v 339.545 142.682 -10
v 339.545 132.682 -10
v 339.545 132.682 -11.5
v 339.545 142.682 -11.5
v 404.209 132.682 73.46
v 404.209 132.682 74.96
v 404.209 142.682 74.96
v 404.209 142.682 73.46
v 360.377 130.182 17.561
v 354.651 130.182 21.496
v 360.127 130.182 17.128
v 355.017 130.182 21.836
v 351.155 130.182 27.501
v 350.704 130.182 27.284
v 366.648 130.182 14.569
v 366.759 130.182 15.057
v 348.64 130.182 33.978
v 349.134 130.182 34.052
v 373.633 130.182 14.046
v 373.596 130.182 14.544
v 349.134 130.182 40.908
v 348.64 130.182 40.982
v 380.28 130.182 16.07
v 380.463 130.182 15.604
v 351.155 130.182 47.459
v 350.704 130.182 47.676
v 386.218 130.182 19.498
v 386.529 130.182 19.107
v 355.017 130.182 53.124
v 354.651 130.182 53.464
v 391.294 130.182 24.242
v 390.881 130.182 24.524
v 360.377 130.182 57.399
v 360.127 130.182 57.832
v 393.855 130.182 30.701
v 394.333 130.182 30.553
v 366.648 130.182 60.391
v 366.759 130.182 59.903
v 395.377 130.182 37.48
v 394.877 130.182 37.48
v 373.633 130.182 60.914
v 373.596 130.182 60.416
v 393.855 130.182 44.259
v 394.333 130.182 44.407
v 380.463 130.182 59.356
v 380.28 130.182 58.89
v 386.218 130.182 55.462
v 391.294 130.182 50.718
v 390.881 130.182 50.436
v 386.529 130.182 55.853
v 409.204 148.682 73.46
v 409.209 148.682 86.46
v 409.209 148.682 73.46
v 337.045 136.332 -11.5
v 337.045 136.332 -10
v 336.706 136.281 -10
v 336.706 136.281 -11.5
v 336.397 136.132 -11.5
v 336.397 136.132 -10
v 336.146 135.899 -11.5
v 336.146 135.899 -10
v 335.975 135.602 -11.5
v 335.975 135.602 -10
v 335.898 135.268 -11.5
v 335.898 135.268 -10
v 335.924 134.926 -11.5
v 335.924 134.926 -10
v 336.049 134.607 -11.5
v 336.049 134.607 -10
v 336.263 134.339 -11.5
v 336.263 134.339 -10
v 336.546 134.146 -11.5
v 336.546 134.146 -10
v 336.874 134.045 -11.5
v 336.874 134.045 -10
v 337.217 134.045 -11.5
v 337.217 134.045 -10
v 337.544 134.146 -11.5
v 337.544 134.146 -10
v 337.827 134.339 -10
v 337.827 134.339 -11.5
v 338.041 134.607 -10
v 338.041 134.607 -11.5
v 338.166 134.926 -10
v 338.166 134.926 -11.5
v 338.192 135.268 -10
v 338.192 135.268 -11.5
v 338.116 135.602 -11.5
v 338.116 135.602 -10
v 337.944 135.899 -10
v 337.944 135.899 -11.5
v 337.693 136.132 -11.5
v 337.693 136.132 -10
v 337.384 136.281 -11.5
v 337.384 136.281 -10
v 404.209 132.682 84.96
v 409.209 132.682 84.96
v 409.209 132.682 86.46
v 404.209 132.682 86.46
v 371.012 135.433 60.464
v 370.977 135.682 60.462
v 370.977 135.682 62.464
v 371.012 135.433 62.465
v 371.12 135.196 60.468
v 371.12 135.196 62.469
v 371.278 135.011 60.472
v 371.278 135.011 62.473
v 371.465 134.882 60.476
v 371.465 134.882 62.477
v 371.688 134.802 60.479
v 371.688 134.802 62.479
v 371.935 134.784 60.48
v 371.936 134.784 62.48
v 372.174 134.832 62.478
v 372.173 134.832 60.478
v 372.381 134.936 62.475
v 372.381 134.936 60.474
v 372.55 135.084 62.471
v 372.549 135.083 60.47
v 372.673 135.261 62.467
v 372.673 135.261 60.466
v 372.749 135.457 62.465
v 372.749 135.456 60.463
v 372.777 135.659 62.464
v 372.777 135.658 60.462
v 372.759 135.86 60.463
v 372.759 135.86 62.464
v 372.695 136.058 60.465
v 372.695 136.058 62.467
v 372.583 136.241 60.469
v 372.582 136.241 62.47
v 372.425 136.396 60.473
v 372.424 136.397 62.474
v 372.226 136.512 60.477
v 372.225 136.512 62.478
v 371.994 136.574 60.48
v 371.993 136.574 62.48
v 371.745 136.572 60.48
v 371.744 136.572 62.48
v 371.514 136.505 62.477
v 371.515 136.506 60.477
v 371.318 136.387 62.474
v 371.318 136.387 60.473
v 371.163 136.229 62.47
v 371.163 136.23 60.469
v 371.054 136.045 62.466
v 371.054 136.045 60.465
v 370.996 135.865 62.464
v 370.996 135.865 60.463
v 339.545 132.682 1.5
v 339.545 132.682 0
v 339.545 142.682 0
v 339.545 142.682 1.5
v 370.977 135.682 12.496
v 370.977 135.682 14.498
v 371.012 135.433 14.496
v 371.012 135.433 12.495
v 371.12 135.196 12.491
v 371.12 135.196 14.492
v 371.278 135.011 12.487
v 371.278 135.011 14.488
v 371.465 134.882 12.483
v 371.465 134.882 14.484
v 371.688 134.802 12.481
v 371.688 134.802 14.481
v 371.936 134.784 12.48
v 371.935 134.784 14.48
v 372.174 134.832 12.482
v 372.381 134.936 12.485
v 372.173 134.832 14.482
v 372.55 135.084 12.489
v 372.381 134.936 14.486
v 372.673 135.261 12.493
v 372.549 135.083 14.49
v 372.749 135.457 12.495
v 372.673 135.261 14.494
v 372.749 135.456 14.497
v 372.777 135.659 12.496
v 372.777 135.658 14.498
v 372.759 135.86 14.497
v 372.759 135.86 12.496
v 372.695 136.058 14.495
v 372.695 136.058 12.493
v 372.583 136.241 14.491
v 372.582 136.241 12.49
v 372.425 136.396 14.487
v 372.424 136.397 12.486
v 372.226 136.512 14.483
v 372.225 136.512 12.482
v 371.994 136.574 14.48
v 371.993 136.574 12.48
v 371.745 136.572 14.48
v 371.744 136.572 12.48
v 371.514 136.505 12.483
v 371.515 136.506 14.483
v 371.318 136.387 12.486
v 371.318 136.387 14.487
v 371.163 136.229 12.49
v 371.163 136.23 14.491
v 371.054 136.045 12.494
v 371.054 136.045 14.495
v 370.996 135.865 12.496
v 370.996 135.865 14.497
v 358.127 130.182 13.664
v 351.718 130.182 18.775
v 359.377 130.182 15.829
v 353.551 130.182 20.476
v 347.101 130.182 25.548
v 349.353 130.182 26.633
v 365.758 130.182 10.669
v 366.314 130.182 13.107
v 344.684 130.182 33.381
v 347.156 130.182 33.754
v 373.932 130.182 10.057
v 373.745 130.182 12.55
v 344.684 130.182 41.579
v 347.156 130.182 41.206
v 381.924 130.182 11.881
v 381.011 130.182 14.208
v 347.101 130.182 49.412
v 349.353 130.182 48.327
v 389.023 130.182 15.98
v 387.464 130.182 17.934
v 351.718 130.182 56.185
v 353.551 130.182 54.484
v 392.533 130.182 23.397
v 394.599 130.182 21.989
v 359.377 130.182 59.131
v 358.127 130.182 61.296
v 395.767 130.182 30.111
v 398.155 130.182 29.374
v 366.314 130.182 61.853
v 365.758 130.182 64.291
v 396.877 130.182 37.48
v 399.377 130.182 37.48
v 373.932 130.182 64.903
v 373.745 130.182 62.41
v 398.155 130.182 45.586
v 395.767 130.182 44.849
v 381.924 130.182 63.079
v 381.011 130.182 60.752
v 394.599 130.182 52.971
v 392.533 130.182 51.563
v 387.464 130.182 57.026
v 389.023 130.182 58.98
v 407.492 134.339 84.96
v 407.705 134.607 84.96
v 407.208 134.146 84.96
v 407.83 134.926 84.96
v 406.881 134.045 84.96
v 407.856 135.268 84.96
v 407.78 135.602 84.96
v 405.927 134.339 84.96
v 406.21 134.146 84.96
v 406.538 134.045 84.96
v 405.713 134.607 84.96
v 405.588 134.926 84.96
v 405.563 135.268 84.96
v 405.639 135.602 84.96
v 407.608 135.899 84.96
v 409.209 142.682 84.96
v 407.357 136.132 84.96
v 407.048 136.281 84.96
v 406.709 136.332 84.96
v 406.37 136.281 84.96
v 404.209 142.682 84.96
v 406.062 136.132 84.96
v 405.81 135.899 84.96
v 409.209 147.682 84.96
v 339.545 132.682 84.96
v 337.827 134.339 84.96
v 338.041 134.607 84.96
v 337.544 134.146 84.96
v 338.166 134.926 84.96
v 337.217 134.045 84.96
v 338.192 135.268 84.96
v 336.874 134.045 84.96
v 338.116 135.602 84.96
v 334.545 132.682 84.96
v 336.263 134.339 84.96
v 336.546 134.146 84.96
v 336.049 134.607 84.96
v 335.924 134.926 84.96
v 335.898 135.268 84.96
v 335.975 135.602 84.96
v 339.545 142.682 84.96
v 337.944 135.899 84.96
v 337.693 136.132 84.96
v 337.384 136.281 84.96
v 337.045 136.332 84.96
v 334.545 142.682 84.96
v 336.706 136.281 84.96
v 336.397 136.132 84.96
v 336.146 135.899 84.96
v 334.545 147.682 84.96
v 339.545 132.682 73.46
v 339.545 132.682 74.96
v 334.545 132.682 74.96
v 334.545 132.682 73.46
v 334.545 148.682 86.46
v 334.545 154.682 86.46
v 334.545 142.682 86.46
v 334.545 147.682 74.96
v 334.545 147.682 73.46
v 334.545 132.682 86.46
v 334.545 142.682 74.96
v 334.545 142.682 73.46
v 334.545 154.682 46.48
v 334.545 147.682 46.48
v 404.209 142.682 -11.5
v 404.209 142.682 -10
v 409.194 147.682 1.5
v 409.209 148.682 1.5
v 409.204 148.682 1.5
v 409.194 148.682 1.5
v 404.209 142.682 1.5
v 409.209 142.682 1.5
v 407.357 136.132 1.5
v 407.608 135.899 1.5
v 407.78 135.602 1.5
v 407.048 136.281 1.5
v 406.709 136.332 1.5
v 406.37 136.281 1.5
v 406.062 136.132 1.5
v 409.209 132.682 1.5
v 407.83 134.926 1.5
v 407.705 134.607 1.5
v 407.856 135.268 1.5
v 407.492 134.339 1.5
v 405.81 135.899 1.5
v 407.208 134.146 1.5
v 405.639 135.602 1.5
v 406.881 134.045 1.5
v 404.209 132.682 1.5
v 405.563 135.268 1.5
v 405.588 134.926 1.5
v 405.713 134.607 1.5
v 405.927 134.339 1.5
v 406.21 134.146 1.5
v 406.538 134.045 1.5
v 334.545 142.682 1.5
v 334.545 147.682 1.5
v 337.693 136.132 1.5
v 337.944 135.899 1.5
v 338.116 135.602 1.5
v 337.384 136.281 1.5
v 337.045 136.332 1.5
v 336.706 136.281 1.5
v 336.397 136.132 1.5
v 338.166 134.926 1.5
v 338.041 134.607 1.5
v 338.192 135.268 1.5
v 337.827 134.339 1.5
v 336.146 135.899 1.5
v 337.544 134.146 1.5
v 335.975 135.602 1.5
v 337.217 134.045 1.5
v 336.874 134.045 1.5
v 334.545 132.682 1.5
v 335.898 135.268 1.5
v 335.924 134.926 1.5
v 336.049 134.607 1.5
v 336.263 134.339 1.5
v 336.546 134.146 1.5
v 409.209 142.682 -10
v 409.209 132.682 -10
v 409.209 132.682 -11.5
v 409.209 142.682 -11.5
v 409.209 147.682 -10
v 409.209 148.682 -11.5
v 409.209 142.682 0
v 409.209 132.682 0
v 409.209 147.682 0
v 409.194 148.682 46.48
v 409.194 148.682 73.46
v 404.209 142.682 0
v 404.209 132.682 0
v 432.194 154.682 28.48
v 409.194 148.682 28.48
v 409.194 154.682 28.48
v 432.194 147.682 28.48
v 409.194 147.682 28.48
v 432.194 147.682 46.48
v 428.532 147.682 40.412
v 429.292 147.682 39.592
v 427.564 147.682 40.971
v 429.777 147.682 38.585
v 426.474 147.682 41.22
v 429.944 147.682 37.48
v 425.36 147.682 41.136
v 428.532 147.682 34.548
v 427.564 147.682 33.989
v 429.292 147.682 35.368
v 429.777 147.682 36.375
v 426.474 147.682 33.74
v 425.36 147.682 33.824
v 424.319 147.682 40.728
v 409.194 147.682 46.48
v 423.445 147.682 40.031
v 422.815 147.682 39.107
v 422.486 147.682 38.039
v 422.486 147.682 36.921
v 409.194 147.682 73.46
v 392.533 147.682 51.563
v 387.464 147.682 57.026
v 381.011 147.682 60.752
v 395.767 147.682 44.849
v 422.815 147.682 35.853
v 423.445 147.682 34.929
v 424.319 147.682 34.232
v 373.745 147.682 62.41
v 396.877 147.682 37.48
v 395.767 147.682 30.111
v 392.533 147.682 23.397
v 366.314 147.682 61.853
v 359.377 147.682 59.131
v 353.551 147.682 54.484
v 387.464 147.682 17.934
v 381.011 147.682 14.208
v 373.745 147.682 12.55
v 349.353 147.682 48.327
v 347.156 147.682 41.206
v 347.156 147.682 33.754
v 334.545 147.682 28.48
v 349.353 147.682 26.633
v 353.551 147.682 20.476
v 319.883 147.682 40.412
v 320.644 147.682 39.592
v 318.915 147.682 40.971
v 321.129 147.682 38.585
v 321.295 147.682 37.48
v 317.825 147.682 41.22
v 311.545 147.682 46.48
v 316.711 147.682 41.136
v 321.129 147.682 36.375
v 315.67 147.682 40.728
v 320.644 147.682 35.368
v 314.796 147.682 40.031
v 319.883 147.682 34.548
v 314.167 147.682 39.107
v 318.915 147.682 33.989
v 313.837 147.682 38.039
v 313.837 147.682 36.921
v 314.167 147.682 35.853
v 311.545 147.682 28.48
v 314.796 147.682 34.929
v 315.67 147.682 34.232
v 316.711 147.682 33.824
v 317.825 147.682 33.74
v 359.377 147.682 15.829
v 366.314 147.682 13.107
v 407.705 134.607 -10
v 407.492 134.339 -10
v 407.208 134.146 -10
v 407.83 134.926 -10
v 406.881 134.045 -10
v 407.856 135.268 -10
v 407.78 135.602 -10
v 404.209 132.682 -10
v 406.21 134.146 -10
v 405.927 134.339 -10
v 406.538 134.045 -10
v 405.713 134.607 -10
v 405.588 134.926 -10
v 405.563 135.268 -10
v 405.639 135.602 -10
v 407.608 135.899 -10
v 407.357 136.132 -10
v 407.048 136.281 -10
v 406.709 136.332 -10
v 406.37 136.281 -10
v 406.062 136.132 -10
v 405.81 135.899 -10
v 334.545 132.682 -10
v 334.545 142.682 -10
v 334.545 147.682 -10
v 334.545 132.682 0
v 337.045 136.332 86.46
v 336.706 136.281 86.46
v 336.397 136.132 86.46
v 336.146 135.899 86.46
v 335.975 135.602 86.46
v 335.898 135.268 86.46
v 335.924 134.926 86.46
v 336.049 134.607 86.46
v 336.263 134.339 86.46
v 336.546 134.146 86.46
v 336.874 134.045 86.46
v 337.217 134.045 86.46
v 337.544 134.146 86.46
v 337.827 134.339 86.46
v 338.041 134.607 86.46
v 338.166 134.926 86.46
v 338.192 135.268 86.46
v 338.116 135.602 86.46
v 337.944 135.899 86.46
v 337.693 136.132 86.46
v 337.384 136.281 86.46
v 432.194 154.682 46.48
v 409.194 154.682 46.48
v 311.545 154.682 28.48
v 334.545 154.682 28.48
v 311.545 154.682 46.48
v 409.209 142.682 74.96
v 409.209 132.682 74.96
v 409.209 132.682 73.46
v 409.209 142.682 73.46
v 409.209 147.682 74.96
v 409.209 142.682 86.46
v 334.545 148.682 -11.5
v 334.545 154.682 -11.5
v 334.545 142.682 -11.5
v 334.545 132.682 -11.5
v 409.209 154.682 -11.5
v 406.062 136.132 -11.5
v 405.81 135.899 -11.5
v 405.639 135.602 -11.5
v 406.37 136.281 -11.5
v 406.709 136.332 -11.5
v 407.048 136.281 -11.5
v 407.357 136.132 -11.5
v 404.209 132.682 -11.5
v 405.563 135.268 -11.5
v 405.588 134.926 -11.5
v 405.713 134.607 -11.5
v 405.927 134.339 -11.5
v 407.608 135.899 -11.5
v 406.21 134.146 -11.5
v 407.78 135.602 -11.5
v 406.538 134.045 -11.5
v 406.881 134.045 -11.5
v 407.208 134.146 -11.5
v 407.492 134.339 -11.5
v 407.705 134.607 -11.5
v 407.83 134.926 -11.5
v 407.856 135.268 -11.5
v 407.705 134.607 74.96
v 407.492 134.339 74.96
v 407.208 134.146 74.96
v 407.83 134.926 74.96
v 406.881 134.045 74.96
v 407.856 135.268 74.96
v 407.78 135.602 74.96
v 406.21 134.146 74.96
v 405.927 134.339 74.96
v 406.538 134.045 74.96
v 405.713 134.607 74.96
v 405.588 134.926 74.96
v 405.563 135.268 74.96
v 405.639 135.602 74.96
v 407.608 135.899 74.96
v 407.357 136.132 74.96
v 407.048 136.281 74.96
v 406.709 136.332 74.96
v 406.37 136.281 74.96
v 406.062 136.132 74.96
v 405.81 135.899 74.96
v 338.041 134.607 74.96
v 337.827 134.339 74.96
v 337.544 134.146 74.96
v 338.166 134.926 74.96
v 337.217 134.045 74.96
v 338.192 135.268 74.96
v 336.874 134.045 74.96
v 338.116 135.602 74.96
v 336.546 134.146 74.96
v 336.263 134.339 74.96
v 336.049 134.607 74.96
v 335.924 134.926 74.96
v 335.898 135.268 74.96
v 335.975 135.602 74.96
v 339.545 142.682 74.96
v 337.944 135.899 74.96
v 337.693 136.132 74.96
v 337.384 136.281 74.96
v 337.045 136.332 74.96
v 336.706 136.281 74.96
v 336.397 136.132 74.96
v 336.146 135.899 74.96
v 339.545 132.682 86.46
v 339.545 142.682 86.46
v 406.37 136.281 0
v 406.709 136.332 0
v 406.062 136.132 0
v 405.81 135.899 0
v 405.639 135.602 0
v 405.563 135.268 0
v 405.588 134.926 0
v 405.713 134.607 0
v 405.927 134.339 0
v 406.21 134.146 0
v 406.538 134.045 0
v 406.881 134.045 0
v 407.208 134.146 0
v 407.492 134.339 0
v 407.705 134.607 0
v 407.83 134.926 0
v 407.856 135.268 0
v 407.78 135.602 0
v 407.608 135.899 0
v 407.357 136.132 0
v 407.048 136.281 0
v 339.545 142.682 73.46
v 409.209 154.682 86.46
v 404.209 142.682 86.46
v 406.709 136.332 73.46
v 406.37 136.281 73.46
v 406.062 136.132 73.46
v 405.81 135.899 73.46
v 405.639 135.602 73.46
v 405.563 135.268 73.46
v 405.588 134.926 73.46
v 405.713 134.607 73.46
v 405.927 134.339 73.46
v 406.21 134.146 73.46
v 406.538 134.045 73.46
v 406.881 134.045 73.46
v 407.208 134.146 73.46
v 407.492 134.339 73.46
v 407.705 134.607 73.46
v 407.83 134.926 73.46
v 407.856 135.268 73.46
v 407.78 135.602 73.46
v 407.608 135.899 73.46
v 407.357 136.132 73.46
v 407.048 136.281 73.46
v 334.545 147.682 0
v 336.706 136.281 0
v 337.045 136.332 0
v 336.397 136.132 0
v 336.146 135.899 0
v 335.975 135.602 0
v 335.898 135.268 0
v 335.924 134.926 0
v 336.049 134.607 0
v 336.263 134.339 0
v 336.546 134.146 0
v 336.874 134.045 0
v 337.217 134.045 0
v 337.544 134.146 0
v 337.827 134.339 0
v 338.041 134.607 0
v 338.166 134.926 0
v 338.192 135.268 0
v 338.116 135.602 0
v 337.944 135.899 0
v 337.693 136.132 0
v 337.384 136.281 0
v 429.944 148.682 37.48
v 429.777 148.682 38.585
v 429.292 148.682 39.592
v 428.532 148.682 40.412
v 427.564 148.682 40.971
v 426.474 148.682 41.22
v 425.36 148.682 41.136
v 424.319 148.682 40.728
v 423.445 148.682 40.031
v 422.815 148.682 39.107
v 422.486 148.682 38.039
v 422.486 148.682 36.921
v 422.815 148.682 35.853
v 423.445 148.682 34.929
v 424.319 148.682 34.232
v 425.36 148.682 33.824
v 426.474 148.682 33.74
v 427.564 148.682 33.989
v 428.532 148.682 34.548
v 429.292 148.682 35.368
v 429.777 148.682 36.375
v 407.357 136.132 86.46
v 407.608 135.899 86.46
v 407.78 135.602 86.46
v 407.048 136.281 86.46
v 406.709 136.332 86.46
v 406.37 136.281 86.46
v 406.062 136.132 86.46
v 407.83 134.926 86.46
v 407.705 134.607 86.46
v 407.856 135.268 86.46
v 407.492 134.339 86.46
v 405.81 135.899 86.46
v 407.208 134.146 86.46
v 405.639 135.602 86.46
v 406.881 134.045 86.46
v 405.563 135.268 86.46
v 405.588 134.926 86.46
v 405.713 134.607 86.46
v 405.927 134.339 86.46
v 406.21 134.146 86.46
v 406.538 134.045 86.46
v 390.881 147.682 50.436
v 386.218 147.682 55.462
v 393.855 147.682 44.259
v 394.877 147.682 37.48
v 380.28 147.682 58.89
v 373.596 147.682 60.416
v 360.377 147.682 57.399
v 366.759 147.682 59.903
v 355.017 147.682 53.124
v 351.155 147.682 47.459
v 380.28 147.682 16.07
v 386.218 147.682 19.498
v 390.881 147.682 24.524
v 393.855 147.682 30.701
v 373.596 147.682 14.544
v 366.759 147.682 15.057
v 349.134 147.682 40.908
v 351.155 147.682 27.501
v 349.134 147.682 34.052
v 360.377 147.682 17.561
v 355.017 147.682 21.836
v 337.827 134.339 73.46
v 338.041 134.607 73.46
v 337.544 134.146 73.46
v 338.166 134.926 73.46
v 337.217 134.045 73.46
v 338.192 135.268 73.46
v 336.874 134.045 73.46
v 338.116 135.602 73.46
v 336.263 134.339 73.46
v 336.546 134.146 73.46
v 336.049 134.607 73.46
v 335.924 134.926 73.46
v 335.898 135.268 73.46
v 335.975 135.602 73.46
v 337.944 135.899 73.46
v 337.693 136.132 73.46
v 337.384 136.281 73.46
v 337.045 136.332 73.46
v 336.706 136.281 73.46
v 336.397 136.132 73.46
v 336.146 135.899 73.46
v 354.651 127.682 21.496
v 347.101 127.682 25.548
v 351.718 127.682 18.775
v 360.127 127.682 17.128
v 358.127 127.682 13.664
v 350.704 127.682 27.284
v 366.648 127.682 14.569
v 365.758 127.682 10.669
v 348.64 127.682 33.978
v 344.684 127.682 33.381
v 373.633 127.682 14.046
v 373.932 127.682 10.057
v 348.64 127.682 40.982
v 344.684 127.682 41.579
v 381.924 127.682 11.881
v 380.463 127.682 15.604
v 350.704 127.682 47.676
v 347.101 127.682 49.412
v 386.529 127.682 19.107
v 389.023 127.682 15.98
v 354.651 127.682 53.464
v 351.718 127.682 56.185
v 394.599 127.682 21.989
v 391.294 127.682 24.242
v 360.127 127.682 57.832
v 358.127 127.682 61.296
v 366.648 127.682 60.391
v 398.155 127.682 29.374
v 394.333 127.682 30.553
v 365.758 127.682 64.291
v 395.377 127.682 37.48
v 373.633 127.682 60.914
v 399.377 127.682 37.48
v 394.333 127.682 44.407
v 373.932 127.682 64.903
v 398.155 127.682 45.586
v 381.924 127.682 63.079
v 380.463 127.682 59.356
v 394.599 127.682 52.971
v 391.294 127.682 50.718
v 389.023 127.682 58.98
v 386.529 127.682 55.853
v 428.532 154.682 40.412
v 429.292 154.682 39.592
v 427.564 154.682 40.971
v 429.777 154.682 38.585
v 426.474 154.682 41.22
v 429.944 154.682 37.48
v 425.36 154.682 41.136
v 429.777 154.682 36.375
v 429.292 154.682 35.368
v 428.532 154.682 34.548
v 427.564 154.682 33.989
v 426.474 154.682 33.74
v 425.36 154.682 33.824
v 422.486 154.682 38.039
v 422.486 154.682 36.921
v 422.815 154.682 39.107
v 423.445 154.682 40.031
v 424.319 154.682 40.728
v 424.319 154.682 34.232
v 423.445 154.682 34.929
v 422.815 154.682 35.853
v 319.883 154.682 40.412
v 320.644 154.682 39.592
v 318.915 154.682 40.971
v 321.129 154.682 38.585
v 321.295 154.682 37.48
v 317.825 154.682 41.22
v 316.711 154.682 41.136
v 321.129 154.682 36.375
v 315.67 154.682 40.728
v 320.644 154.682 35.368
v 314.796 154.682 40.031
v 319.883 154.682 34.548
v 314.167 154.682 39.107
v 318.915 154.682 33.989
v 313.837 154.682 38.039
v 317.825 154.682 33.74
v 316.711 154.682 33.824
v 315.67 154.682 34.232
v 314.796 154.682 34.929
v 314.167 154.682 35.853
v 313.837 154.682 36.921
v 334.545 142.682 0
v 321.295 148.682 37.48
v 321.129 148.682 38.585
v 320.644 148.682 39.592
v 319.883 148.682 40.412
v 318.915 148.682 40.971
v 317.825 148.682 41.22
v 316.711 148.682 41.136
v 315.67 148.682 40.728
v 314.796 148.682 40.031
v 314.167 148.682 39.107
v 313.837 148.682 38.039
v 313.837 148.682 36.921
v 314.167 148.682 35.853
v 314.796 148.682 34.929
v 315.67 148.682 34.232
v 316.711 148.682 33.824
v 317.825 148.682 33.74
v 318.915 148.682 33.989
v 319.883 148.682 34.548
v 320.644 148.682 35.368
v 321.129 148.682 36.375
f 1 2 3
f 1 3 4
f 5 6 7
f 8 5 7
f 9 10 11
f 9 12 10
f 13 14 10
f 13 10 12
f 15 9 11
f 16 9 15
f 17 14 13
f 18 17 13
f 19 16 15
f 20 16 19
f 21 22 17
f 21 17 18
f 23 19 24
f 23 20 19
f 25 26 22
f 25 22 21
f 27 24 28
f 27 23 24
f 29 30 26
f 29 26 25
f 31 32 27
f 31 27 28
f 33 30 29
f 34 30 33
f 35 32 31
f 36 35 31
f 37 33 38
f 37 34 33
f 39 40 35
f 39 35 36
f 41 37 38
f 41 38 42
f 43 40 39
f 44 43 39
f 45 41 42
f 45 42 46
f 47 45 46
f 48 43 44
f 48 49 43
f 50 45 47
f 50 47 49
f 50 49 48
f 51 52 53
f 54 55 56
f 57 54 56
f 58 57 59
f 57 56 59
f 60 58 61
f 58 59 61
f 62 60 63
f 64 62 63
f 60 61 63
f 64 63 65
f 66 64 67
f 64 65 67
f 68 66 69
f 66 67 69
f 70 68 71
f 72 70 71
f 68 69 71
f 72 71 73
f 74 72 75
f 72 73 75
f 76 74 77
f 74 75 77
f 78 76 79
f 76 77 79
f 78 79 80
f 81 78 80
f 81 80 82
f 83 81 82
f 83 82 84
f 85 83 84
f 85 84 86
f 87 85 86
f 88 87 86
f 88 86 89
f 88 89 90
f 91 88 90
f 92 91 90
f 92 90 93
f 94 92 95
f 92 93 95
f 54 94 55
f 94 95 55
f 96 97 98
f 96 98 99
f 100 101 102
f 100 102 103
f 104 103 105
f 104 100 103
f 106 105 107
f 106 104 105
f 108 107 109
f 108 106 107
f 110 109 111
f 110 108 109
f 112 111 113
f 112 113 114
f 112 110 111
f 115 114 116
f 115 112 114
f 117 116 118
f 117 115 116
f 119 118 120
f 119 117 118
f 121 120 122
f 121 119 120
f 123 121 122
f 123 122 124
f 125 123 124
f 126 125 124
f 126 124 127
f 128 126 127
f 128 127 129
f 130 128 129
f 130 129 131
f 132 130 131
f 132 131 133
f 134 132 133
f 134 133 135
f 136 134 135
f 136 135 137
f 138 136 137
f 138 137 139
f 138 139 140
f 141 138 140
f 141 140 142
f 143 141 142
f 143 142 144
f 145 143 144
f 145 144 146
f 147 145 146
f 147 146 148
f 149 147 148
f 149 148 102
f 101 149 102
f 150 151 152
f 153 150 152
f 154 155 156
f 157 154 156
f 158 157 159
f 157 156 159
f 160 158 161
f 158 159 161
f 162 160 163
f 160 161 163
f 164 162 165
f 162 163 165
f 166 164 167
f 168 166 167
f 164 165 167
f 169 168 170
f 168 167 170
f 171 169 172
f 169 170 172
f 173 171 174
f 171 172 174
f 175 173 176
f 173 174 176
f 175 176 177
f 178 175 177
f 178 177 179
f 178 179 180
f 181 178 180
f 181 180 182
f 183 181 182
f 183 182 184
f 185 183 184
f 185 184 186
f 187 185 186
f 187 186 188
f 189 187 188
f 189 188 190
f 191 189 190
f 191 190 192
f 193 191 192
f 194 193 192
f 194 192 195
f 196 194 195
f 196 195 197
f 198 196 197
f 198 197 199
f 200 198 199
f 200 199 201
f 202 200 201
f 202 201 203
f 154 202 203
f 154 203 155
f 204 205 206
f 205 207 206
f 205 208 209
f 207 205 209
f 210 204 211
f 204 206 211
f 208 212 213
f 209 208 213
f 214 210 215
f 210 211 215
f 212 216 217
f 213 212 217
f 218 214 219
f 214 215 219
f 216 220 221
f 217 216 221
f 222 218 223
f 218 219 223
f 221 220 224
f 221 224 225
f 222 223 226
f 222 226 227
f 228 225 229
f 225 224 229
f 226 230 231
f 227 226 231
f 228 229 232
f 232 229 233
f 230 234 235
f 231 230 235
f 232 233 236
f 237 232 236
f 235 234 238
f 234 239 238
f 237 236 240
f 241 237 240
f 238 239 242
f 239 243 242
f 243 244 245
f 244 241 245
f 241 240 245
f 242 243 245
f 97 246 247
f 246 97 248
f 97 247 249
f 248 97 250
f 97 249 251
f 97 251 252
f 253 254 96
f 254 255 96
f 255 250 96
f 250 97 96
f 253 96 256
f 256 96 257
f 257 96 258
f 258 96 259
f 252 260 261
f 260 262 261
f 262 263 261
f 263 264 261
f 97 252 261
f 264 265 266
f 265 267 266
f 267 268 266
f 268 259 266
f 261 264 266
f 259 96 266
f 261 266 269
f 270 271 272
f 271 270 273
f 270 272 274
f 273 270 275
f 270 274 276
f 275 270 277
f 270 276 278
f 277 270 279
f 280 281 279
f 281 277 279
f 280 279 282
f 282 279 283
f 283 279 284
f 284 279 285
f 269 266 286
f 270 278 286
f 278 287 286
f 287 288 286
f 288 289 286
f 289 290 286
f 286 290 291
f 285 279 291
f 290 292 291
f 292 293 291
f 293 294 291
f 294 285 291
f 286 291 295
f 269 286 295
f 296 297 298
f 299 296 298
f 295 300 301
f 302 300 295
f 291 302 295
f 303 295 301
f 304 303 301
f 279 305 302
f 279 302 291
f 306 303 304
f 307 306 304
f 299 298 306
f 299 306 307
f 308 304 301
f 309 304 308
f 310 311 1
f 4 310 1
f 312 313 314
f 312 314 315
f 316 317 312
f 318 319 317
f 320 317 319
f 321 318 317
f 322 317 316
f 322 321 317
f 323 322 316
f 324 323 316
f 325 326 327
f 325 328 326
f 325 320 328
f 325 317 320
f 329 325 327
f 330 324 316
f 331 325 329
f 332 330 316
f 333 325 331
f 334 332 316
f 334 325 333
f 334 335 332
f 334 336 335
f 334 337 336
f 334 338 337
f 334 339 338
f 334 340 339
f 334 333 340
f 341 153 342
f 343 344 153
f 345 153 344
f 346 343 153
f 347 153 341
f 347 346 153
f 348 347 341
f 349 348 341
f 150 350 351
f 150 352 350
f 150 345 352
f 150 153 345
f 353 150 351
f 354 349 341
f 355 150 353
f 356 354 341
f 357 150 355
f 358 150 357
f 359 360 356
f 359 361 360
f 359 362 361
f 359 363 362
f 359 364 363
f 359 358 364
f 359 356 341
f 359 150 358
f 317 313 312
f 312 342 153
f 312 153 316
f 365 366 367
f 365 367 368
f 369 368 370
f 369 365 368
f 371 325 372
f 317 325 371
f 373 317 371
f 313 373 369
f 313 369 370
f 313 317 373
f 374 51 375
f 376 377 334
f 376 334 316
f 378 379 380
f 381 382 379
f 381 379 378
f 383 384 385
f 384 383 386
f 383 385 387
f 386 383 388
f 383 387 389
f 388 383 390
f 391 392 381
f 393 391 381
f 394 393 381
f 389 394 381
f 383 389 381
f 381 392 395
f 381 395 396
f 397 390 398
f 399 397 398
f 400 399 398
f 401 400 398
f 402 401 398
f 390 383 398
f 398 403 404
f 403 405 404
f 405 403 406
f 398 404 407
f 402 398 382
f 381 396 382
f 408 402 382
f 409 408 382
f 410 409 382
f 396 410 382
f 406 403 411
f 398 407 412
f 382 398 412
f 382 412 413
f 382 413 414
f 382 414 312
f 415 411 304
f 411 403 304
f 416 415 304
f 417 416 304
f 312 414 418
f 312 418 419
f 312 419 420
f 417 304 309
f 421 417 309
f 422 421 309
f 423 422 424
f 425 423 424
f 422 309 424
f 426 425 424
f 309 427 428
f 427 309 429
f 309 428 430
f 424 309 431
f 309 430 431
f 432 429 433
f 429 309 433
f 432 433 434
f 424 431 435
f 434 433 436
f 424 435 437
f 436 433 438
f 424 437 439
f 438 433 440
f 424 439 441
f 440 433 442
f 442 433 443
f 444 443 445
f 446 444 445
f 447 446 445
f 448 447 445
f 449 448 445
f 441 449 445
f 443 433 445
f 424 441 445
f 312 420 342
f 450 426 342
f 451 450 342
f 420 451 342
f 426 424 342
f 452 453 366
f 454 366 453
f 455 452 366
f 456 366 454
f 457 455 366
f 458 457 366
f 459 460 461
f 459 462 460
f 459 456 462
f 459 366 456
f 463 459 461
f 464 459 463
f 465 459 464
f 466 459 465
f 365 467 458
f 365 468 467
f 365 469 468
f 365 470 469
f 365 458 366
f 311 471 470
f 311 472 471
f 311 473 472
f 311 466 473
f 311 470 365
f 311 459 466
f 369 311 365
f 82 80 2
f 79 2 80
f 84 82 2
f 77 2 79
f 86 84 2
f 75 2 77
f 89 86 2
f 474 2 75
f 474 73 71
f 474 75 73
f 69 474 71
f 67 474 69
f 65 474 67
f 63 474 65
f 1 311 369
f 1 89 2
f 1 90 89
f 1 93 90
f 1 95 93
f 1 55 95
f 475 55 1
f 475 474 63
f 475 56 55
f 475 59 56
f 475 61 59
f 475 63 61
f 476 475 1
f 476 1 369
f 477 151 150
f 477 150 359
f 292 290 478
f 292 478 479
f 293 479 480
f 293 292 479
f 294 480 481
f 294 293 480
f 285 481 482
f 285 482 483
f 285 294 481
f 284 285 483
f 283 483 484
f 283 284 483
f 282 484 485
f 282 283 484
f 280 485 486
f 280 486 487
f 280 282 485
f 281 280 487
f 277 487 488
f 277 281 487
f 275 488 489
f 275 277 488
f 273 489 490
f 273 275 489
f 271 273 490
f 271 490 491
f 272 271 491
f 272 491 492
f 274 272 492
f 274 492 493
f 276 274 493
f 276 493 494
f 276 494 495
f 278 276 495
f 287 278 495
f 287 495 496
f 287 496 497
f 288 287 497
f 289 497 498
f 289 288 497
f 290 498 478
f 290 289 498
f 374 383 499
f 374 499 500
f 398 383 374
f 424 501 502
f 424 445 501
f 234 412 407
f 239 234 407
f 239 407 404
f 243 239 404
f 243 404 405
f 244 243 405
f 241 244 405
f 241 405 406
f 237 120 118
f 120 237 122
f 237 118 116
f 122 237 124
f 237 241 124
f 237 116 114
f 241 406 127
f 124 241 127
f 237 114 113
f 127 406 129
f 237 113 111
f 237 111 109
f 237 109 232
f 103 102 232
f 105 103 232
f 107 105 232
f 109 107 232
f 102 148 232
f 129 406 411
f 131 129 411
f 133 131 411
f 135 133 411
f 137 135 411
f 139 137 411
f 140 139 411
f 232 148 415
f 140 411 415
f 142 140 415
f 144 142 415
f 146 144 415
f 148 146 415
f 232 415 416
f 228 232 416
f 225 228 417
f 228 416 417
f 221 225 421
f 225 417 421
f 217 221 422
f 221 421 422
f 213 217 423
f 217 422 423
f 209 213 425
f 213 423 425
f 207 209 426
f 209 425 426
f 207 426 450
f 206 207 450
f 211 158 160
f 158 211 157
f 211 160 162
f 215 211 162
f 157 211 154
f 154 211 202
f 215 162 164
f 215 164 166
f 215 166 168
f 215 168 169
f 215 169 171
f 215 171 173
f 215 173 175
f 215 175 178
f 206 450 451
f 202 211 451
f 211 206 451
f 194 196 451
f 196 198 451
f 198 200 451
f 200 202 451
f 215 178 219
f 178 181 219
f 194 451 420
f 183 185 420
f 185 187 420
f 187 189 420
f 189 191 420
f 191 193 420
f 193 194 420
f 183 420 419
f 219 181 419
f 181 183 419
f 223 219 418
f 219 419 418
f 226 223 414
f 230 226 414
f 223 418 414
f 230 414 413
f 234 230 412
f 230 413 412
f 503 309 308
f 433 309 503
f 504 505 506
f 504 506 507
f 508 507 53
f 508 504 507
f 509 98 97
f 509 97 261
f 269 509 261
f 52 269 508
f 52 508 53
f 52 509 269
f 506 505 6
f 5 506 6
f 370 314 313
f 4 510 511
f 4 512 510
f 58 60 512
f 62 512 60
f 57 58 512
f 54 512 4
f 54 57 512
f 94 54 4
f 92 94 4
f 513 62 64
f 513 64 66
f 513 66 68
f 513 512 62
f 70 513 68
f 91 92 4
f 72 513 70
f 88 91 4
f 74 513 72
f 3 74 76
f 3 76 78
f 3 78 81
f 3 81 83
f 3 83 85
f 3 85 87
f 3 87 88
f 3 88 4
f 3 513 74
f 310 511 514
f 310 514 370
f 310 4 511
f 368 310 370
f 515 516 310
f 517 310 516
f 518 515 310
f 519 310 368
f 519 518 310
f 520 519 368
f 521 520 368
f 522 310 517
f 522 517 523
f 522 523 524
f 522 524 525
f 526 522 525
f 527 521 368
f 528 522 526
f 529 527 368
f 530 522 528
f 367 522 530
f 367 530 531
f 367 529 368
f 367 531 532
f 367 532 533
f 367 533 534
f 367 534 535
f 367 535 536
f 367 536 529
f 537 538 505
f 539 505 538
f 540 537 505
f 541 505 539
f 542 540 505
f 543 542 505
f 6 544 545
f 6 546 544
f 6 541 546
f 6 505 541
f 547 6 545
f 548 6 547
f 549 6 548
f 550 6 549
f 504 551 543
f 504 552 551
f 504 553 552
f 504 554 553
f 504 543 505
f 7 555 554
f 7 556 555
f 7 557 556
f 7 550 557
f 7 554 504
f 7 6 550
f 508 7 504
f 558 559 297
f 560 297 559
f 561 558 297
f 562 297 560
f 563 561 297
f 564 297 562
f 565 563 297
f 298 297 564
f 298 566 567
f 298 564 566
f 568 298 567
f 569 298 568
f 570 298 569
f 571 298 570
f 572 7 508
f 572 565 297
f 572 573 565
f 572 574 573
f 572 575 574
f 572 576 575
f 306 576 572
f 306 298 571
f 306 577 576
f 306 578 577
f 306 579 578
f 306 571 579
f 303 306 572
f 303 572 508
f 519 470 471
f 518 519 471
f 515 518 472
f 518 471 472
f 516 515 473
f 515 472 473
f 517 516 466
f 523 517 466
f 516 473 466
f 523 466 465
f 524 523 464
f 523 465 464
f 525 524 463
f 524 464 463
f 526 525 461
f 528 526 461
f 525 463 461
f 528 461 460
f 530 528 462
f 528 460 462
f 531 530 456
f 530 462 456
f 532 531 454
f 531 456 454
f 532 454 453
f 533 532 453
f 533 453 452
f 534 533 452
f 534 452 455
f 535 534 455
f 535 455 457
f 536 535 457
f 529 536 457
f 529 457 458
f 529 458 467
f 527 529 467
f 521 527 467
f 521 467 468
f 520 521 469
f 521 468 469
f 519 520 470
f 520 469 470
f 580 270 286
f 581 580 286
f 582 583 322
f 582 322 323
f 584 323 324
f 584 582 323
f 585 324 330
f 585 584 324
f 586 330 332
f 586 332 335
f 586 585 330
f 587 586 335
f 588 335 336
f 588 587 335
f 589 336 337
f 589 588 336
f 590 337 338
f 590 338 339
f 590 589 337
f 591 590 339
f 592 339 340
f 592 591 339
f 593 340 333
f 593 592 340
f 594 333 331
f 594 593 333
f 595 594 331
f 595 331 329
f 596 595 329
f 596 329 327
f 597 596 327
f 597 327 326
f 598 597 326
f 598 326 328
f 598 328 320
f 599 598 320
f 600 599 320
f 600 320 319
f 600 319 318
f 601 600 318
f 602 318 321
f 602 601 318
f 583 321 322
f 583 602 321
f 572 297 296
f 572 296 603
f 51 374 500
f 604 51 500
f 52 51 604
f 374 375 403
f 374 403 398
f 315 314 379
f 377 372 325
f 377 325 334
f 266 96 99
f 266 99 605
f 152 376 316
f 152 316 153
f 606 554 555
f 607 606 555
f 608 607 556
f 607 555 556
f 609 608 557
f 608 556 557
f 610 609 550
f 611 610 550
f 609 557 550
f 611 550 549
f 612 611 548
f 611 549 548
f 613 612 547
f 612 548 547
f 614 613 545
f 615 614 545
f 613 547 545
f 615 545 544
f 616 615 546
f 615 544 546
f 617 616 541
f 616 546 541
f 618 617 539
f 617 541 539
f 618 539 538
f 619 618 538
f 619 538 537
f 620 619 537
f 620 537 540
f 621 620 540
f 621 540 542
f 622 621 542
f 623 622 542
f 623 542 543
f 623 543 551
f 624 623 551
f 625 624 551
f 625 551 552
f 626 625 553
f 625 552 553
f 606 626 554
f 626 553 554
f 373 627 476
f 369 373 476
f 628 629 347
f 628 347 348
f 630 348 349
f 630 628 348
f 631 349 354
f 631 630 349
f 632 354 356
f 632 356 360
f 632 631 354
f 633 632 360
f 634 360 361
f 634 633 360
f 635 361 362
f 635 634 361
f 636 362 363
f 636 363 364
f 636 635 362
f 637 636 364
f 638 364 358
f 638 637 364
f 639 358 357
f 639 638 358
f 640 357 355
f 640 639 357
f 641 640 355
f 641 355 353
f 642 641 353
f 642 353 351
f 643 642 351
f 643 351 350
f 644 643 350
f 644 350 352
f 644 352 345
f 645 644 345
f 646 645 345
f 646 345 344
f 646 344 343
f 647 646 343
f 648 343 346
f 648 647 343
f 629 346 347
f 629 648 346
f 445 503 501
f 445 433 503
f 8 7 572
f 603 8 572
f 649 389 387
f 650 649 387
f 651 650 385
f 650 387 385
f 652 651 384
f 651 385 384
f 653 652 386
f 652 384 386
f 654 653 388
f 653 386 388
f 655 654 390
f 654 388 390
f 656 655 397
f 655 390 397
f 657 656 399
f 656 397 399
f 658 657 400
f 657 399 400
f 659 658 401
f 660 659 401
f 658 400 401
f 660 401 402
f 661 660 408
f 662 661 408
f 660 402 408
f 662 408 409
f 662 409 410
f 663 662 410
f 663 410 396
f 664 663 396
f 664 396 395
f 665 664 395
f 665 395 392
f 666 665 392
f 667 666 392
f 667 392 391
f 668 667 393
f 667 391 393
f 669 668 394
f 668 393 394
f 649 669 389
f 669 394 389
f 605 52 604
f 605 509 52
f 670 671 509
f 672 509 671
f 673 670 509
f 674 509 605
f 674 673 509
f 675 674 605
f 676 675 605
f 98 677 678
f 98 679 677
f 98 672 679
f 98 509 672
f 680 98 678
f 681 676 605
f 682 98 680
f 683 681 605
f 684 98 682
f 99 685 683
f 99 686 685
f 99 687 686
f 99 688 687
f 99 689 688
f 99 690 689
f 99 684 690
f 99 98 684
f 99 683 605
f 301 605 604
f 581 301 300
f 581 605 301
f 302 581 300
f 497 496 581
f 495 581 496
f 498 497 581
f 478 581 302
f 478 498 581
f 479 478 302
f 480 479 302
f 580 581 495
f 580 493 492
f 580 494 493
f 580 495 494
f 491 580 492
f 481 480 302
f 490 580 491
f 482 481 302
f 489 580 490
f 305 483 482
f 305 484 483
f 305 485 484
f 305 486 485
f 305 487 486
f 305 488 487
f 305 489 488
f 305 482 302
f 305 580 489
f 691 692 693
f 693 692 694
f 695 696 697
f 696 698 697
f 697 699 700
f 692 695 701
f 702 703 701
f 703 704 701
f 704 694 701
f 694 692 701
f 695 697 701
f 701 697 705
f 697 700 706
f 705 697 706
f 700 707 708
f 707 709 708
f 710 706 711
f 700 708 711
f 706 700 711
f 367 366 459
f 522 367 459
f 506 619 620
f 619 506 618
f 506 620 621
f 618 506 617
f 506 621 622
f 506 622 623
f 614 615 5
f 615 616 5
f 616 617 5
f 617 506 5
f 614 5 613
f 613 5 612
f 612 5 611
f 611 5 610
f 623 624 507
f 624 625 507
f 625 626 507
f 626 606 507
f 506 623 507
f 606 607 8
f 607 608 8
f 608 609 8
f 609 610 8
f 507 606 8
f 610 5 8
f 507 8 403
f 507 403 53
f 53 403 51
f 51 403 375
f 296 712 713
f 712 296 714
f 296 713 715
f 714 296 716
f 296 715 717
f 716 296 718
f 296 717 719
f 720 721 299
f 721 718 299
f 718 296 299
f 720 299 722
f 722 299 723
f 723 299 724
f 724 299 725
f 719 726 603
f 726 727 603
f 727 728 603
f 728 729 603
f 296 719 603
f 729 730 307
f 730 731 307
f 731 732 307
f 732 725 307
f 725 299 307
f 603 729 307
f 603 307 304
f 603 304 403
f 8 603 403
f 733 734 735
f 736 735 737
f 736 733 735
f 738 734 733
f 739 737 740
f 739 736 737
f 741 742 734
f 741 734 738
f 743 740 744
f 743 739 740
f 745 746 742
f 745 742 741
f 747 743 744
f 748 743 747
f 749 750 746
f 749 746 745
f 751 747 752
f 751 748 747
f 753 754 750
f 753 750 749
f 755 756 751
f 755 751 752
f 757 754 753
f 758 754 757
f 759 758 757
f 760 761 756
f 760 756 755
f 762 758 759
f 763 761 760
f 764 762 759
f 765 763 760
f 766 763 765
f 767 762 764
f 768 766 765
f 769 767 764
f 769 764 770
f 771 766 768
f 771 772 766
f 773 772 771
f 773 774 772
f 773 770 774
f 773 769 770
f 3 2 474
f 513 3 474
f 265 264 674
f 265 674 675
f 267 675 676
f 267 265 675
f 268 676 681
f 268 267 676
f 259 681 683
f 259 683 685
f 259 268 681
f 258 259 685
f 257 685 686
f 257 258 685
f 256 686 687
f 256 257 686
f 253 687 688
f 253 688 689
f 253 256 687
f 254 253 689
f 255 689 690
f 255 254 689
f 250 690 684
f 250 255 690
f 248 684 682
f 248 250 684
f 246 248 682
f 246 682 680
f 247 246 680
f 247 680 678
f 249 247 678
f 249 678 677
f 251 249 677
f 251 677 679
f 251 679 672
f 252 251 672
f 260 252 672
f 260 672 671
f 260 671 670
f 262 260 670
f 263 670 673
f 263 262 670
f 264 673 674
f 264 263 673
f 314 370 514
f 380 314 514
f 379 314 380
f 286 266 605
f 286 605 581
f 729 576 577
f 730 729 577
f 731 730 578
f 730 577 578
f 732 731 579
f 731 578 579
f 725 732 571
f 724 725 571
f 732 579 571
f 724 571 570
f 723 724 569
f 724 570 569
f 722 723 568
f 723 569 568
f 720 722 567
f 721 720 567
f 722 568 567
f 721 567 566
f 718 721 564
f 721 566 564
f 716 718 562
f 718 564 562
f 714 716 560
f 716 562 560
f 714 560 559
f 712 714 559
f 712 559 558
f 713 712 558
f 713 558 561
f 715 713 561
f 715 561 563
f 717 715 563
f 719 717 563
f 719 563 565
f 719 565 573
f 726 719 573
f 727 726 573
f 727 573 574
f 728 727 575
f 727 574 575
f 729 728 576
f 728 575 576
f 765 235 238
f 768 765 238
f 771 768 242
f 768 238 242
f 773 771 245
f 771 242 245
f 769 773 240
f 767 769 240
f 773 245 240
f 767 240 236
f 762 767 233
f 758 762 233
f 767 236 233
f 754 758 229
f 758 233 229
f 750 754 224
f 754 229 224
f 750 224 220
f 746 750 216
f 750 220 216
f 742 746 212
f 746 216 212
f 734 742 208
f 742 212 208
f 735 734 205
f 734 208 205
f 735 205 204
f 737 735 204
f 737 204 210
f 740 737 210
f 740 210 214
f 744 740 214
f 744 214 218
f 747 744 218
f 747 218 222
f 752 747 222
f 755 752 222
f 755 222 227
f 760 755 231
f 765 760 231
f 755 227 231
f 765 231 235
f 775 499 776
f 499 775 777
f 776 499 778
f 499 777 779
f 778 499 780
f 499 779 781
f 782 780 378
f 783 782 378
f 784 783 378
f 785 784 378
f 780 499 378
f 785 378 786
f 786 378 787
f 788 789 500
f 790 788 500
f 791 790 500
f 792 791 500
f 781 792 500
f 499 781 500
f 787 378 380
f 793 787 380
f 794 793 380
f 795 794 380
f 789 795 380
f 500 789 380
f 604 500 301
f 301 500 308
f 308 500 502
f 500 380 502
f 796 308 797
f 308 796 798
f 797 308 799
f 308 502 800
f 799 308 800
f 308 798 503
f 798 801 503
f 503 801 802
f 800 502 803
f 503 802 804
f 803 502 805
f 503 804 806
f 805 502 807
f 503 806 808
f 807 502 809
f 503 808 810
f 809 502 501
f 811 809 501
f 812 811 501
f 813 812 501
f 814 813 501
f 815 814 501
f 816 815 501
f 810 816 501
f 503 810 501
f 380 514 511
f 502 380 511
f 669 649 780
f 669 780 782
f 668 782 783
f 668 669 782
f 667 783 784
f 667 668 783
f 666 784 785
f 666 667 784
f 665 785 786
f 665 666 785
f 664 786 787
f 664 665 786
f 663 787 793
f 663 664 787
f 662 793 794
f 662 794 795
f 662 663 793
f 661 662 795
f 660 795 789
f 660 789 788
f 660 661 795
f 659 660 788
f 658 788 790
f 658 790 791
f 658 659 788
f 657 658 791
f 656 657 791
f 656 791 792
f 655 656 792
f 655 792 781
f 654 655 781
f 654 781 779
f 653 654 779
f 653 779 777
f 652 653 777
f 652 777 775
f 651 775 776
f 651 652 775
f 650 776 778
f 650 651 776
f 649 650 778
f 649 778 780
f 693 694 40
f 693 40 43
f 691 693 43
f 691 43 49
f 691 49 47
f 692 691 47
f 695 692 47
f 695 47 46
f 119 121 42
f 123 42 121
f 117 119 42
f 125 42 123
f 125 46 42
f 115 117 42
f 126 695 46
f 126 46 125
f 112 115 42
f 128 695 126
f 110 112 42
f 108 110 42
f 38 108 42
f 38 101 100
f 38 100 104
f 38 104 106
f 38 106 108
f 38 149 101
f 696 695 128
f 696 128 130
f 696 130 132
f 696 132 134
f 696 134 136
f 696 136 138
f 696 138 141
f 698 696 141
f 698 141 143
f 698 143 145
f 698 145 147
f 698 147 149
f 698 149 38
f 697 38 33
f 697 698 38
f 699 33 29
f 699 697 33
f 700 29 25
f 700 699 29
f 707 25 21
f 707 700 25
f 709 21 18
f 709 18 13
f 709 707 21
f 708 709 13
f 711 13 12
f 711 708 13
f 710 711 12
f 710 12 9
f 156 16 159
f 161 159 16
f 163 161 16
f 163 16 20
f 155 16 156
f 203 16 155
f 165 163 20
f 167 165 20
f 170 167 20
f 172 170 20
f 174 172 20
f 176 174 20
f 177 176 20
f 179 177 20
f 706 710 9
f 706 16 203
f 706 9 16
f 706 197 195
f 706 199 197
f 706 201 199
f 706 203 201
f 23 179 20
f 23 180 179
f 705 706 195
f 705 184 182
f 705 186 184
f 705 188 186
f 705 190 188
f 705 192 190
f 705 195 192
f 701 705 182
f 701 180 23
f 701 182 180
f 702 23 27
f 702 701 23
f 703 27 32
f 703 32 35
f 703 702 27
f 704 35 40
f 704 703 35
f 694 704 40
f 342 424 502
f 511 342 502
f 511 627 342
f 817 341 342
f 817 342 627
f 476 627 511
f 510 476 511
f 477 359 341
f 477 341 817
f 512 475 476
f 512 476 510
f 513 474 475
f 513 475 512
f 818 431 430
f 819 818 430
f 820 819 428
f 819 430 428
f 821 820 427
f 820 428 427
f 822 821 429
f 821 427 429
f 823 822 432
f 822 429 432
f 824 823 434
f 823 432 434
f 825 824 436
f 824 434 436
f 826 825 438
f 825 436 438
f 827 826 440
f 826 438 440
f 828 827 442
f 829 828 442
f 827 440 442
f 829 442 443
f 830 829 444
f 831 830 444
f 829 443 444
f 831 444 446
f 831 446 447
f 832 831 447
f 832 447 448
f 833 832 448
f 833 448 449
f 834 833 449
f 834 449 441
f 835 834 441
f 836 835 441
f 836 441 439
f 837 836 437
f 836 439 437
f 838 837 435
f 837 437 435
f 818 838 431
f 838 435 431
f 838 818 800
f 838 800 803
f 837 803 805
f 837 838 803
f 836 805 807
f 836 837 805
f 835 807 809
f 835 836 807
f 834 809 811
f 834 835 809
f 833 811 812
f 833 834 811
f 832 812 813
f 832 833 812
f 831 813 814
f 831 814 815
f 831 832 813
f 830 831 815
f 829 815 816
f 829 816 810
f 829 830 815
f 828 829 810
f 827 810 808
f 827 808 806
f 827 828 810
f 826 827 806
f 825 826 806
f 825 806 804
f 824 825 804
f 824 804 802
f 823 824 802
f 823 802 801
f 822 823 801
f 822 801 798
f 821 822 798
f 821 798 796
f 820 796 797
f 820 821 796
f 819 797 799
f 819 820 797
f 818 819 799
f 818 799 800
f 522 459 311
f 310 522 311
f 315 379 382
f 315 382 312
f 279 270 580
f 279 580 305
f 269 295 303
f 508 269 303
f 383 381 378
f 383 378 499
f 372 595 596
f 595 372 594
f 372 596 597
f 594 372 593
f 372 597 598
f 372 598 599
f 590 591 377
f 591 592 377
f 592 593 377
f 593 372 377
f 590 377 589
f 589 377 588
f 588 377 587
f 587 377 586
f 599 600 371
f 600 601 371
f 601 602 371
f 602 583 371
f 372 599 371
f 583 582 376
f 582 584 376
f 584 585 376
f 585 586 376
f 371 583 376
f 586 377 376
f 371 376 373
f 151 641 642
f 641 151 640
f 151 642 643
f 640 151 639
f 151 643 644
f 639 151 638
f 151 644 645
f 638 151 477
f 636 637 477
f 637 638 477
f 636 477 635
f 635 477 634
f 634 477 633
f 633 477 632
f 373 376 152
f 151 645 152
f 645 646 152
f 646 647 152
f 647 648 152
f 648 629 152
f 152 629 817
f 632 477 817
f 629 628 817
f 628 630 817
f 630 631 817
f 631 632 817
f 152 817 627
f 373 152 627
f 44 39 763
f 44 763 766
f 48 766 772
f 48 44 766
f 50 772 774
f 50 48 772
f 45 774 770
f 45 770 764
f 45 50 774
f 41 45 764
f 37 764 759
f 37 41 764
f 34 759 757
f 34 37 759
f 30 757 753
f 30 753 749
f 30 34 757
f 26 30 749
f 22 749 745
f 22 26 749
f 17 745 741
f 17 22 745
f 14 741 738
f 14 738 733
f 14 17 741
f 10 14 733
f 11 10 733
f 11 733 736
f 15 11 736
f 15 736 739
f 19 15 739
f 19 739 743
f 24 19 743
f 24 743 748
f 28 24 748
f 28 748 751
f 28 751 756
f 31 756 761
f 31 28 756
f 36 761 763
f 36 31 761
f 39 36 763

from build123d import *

# Parameters (mm, degrees)
SKETCH2_W               = 5
SKETCH2_H               = 74.664160083
SKETCH2_W_2             = 10
SKETCH2_H_2             = 5
SKETCH2_R               = 1.15
BOSS_EXTRUDE1_DEPTH     = 1.5
SKETCH3_W               = 13
SKETCH3_H               = 74.664160083
BOSS_EXTRUDE2_DEPTH     = 1
SKETCH5_W               = 97.96
SKETCH5_H               = 74.648794292
BOSS_EXTRUDE3_DEPTH     = 1
SKETCH6_R               = 25
SKETCH6_R_2             = 23
BOSS_EXTRUDE4_DEPTH     = 17.5
SKETCH8_R               = 27.5
SKETCH8_R_2             = 23.5
BOSS_EXTRUDE6_DEPTH     = 2.5
SKETCH13_W              = 18
SKETCH13_H              = 23
BOSS_EXTRUDE7_DEPTH     = 1
SKETCH15_R              = 3.75
CUT_EXTRUDE3_DEPTH      = 1
BODY_MOVE_COPY2_ANGLE   = 90
SKETCH16_R              = 3.75
BOSS_EXTRUDE8_DEPTH     = 6
SKETCH17_R              = 0.9
CUT_EXTRUDE4_DEPTH      = 46
CUT_EXTRUDE4_DEPTH_BACK = 44


with BuildPart() as part:
    # Sketch2 → Boss-Extrude1 (new body)
    with BuildSketch(Plane.XY):
        with Locations((376.369557123, 140.674264472)):
            Rectangle(SKETCH2_W, SKETCH2_H)
        with Locations((368.869557123, 175.506344513)):
            Rectangle(SKETCH2_W_2, SKETCH2_H_2)
        with Locations((366.369557123, 175.506344513)):
            Circle(SKETCH2_R, mode=Mode.SUBTRACT)
        with Locations((368.869557123, 105.84218443)):
            Rectangle(SKETCH2_W_2, SKETCH2_H_2)
        with Locations((366.369557123, 105.84218443)):
            Circle(SKETCH2_R, mode=Mode.SUBTRACT)
    boss_extrude1 = extrude(amount=BOSS_EXTRUDE1_DEPTH)

    # Sketch3 → Boss-Extrude2 (add)
    with BuildSketch(Plane(origin=(378.869557123, 0, 0), x_dir=(0, 0, -1), z_dir=(1, 0, 0))):
        with Locations((5, 140.674264472)):
            Rectangle(SKETCH3_W, SKETCH3_H)
    extrude(amount=BOSS_EXTRUDE2_DEPTH)

    # Mirror3: Boss-Extrude1 across plane
    add(boss_extrude1.mirror(Plane(origin=(0, 0, -5), x_dir=(1, 0, 0), z_dir=(0, 0, -1))))


with BuildPart() as body_2:
    # Body-Move/Copy1: copy of part
    add(part.part.moved(Location((0, 0, 84.96))))


with BuildPart() as part_1:
    add(part.part)

    add(body_2.part)  # Boss-Extrude3 merges body 2
    # Sketch5 → Boss-Extrude3 (add)
    with BuildSketch(Plane(origin=(379.869557123, 0, 0), x_dir=(0, 0, -1), z_dir=(1, 0, 0))):
        with Locations((-37.48, 140.681947367)):
            Rectangle(SKETCH5_W, SKETCH5_H)
    extrude(amount=-BOSS_EXTRUDE3_DEPTH)

    # Sketch6 → Boss-Extrude4 (add)
    with BuildSketch(Plane.ZY.offset(-378.869557123)):
        with Locations(Location((37.48, 140.674264472, 0), (0, 0, 270))):
            Circle(SKETCH6_R)
        with Locations(Location((37.48, 140.674264472, 0), (0, 0, 270))):
            Circle(SKETCH6_R_2, mode=Mode.SUBTRACT)
    extrude(amount=BOSS_EXTRUDE4_DEPTH)

    # Sketch8 → Boss-Extrude6 (add)
    with BuildSketch(Plane.ZY.offset(-361.369557123)):
        with Locations(Location((37.48, 140.674264472, 0), (0, 0, 270))):
            Circle(SKETCH8_R)
        with Locations(Location((37.48, 140.674264472, 0), (0, 0, 270))):
            Circle(SKETCH8_R_2, mode=Mode.SUBTRACT)
    extrude(amount=BOSS_EXTRUDE6_DEPTH)

    # Sketch13 → Boss-Extrude7 (add)
    with BuildSketch(Plane.ZY.offset(-378.869557123)):
        with Locations((37.48, 189.506344513)):
            Rectangle(SKETCH13_W, SKETCH13_H)
        with Locations((37.48, 91.857550221)):
            Rectangle(SKETCH13_W, SKETCH13_H)
    extrude(amount=-BOSS_EXTRUDE7_DEPTH)

    # Sketch15 → Cut-Extrude3 (cut)
    with BuildSketch(Plane.ZY.offset(-378.869557123)):
        with Locations(Location((37.48, 195.006344513, 0), (0, 0, 270))):
            Circle(SKETCH15_R)
        with Locations(Location((37.48, 86.357550221, 0), (0, 0, 270))):
            Circle(SKETCH15_R)
    extrude(amount=-CUT_EXTRUDE3_DEPTH, mode=Mode.SUBTRACT)


with BuildPart() as part_2:
    # Body-Move/Copy2: moved
    add(part_1.part.rotate(Axis((371.869557123, 140.681947367, 0), (0, 0, 1)), BODY_MOVE_COPY2_ANGLE))

    # Sketch16 → Boss-Extrude8 (add)
    with BuildSketch(Plane(origin=(0, 148.681947367, 0), x_dir=(1, 0, 0), z_dir=(0, 1, 0))):
        Polygon((334.545159977, -28.48), (334.545159977, 11.5), (409.20932006, 11.5), (409.193954269, -28.48), (432.193954269, -28.48), (432.193954269, -46.48), (409.193954269, -46.48), (409.20932006, -86.46), (334.545159977, -86.46), (334.545159977, -46.48), (311.545159977, -46.48), (311.545159977, -28.48), align=None)
        with Locations((317.545159977, -37.48)):
            Circle(SKETCH16_R, mode=Mode.SUBTRACT)
        with Locations((426.193954269, -37.48)):
            Circle(SKETCH16_R, mode=Mode.SUBTRACT)
    extrude(amount=BOSS_EXTRUDE8_DEPTH)

    # Sketch17 → Cut-Extrude4 (cut, two sides)
    with BuildSketch(Plane.XY.offset(37.48)) as cut_extrude4_sk:
        with Locations(Location((371.877240018, 135.681947367, 0), (0, 0, 180))):
            Circle(SKETCH17_R)
    extrude(amount=CUT_EXTRUDE4_DEPTH, mode=Mode.SUBTRACT)
    extrude(cut_extrude4_sk.sketch, amount=-CUT_EXTRUDE4_DEPTH_BACK, mode=Mode.SUBTRACT)


solid = part_2.part
